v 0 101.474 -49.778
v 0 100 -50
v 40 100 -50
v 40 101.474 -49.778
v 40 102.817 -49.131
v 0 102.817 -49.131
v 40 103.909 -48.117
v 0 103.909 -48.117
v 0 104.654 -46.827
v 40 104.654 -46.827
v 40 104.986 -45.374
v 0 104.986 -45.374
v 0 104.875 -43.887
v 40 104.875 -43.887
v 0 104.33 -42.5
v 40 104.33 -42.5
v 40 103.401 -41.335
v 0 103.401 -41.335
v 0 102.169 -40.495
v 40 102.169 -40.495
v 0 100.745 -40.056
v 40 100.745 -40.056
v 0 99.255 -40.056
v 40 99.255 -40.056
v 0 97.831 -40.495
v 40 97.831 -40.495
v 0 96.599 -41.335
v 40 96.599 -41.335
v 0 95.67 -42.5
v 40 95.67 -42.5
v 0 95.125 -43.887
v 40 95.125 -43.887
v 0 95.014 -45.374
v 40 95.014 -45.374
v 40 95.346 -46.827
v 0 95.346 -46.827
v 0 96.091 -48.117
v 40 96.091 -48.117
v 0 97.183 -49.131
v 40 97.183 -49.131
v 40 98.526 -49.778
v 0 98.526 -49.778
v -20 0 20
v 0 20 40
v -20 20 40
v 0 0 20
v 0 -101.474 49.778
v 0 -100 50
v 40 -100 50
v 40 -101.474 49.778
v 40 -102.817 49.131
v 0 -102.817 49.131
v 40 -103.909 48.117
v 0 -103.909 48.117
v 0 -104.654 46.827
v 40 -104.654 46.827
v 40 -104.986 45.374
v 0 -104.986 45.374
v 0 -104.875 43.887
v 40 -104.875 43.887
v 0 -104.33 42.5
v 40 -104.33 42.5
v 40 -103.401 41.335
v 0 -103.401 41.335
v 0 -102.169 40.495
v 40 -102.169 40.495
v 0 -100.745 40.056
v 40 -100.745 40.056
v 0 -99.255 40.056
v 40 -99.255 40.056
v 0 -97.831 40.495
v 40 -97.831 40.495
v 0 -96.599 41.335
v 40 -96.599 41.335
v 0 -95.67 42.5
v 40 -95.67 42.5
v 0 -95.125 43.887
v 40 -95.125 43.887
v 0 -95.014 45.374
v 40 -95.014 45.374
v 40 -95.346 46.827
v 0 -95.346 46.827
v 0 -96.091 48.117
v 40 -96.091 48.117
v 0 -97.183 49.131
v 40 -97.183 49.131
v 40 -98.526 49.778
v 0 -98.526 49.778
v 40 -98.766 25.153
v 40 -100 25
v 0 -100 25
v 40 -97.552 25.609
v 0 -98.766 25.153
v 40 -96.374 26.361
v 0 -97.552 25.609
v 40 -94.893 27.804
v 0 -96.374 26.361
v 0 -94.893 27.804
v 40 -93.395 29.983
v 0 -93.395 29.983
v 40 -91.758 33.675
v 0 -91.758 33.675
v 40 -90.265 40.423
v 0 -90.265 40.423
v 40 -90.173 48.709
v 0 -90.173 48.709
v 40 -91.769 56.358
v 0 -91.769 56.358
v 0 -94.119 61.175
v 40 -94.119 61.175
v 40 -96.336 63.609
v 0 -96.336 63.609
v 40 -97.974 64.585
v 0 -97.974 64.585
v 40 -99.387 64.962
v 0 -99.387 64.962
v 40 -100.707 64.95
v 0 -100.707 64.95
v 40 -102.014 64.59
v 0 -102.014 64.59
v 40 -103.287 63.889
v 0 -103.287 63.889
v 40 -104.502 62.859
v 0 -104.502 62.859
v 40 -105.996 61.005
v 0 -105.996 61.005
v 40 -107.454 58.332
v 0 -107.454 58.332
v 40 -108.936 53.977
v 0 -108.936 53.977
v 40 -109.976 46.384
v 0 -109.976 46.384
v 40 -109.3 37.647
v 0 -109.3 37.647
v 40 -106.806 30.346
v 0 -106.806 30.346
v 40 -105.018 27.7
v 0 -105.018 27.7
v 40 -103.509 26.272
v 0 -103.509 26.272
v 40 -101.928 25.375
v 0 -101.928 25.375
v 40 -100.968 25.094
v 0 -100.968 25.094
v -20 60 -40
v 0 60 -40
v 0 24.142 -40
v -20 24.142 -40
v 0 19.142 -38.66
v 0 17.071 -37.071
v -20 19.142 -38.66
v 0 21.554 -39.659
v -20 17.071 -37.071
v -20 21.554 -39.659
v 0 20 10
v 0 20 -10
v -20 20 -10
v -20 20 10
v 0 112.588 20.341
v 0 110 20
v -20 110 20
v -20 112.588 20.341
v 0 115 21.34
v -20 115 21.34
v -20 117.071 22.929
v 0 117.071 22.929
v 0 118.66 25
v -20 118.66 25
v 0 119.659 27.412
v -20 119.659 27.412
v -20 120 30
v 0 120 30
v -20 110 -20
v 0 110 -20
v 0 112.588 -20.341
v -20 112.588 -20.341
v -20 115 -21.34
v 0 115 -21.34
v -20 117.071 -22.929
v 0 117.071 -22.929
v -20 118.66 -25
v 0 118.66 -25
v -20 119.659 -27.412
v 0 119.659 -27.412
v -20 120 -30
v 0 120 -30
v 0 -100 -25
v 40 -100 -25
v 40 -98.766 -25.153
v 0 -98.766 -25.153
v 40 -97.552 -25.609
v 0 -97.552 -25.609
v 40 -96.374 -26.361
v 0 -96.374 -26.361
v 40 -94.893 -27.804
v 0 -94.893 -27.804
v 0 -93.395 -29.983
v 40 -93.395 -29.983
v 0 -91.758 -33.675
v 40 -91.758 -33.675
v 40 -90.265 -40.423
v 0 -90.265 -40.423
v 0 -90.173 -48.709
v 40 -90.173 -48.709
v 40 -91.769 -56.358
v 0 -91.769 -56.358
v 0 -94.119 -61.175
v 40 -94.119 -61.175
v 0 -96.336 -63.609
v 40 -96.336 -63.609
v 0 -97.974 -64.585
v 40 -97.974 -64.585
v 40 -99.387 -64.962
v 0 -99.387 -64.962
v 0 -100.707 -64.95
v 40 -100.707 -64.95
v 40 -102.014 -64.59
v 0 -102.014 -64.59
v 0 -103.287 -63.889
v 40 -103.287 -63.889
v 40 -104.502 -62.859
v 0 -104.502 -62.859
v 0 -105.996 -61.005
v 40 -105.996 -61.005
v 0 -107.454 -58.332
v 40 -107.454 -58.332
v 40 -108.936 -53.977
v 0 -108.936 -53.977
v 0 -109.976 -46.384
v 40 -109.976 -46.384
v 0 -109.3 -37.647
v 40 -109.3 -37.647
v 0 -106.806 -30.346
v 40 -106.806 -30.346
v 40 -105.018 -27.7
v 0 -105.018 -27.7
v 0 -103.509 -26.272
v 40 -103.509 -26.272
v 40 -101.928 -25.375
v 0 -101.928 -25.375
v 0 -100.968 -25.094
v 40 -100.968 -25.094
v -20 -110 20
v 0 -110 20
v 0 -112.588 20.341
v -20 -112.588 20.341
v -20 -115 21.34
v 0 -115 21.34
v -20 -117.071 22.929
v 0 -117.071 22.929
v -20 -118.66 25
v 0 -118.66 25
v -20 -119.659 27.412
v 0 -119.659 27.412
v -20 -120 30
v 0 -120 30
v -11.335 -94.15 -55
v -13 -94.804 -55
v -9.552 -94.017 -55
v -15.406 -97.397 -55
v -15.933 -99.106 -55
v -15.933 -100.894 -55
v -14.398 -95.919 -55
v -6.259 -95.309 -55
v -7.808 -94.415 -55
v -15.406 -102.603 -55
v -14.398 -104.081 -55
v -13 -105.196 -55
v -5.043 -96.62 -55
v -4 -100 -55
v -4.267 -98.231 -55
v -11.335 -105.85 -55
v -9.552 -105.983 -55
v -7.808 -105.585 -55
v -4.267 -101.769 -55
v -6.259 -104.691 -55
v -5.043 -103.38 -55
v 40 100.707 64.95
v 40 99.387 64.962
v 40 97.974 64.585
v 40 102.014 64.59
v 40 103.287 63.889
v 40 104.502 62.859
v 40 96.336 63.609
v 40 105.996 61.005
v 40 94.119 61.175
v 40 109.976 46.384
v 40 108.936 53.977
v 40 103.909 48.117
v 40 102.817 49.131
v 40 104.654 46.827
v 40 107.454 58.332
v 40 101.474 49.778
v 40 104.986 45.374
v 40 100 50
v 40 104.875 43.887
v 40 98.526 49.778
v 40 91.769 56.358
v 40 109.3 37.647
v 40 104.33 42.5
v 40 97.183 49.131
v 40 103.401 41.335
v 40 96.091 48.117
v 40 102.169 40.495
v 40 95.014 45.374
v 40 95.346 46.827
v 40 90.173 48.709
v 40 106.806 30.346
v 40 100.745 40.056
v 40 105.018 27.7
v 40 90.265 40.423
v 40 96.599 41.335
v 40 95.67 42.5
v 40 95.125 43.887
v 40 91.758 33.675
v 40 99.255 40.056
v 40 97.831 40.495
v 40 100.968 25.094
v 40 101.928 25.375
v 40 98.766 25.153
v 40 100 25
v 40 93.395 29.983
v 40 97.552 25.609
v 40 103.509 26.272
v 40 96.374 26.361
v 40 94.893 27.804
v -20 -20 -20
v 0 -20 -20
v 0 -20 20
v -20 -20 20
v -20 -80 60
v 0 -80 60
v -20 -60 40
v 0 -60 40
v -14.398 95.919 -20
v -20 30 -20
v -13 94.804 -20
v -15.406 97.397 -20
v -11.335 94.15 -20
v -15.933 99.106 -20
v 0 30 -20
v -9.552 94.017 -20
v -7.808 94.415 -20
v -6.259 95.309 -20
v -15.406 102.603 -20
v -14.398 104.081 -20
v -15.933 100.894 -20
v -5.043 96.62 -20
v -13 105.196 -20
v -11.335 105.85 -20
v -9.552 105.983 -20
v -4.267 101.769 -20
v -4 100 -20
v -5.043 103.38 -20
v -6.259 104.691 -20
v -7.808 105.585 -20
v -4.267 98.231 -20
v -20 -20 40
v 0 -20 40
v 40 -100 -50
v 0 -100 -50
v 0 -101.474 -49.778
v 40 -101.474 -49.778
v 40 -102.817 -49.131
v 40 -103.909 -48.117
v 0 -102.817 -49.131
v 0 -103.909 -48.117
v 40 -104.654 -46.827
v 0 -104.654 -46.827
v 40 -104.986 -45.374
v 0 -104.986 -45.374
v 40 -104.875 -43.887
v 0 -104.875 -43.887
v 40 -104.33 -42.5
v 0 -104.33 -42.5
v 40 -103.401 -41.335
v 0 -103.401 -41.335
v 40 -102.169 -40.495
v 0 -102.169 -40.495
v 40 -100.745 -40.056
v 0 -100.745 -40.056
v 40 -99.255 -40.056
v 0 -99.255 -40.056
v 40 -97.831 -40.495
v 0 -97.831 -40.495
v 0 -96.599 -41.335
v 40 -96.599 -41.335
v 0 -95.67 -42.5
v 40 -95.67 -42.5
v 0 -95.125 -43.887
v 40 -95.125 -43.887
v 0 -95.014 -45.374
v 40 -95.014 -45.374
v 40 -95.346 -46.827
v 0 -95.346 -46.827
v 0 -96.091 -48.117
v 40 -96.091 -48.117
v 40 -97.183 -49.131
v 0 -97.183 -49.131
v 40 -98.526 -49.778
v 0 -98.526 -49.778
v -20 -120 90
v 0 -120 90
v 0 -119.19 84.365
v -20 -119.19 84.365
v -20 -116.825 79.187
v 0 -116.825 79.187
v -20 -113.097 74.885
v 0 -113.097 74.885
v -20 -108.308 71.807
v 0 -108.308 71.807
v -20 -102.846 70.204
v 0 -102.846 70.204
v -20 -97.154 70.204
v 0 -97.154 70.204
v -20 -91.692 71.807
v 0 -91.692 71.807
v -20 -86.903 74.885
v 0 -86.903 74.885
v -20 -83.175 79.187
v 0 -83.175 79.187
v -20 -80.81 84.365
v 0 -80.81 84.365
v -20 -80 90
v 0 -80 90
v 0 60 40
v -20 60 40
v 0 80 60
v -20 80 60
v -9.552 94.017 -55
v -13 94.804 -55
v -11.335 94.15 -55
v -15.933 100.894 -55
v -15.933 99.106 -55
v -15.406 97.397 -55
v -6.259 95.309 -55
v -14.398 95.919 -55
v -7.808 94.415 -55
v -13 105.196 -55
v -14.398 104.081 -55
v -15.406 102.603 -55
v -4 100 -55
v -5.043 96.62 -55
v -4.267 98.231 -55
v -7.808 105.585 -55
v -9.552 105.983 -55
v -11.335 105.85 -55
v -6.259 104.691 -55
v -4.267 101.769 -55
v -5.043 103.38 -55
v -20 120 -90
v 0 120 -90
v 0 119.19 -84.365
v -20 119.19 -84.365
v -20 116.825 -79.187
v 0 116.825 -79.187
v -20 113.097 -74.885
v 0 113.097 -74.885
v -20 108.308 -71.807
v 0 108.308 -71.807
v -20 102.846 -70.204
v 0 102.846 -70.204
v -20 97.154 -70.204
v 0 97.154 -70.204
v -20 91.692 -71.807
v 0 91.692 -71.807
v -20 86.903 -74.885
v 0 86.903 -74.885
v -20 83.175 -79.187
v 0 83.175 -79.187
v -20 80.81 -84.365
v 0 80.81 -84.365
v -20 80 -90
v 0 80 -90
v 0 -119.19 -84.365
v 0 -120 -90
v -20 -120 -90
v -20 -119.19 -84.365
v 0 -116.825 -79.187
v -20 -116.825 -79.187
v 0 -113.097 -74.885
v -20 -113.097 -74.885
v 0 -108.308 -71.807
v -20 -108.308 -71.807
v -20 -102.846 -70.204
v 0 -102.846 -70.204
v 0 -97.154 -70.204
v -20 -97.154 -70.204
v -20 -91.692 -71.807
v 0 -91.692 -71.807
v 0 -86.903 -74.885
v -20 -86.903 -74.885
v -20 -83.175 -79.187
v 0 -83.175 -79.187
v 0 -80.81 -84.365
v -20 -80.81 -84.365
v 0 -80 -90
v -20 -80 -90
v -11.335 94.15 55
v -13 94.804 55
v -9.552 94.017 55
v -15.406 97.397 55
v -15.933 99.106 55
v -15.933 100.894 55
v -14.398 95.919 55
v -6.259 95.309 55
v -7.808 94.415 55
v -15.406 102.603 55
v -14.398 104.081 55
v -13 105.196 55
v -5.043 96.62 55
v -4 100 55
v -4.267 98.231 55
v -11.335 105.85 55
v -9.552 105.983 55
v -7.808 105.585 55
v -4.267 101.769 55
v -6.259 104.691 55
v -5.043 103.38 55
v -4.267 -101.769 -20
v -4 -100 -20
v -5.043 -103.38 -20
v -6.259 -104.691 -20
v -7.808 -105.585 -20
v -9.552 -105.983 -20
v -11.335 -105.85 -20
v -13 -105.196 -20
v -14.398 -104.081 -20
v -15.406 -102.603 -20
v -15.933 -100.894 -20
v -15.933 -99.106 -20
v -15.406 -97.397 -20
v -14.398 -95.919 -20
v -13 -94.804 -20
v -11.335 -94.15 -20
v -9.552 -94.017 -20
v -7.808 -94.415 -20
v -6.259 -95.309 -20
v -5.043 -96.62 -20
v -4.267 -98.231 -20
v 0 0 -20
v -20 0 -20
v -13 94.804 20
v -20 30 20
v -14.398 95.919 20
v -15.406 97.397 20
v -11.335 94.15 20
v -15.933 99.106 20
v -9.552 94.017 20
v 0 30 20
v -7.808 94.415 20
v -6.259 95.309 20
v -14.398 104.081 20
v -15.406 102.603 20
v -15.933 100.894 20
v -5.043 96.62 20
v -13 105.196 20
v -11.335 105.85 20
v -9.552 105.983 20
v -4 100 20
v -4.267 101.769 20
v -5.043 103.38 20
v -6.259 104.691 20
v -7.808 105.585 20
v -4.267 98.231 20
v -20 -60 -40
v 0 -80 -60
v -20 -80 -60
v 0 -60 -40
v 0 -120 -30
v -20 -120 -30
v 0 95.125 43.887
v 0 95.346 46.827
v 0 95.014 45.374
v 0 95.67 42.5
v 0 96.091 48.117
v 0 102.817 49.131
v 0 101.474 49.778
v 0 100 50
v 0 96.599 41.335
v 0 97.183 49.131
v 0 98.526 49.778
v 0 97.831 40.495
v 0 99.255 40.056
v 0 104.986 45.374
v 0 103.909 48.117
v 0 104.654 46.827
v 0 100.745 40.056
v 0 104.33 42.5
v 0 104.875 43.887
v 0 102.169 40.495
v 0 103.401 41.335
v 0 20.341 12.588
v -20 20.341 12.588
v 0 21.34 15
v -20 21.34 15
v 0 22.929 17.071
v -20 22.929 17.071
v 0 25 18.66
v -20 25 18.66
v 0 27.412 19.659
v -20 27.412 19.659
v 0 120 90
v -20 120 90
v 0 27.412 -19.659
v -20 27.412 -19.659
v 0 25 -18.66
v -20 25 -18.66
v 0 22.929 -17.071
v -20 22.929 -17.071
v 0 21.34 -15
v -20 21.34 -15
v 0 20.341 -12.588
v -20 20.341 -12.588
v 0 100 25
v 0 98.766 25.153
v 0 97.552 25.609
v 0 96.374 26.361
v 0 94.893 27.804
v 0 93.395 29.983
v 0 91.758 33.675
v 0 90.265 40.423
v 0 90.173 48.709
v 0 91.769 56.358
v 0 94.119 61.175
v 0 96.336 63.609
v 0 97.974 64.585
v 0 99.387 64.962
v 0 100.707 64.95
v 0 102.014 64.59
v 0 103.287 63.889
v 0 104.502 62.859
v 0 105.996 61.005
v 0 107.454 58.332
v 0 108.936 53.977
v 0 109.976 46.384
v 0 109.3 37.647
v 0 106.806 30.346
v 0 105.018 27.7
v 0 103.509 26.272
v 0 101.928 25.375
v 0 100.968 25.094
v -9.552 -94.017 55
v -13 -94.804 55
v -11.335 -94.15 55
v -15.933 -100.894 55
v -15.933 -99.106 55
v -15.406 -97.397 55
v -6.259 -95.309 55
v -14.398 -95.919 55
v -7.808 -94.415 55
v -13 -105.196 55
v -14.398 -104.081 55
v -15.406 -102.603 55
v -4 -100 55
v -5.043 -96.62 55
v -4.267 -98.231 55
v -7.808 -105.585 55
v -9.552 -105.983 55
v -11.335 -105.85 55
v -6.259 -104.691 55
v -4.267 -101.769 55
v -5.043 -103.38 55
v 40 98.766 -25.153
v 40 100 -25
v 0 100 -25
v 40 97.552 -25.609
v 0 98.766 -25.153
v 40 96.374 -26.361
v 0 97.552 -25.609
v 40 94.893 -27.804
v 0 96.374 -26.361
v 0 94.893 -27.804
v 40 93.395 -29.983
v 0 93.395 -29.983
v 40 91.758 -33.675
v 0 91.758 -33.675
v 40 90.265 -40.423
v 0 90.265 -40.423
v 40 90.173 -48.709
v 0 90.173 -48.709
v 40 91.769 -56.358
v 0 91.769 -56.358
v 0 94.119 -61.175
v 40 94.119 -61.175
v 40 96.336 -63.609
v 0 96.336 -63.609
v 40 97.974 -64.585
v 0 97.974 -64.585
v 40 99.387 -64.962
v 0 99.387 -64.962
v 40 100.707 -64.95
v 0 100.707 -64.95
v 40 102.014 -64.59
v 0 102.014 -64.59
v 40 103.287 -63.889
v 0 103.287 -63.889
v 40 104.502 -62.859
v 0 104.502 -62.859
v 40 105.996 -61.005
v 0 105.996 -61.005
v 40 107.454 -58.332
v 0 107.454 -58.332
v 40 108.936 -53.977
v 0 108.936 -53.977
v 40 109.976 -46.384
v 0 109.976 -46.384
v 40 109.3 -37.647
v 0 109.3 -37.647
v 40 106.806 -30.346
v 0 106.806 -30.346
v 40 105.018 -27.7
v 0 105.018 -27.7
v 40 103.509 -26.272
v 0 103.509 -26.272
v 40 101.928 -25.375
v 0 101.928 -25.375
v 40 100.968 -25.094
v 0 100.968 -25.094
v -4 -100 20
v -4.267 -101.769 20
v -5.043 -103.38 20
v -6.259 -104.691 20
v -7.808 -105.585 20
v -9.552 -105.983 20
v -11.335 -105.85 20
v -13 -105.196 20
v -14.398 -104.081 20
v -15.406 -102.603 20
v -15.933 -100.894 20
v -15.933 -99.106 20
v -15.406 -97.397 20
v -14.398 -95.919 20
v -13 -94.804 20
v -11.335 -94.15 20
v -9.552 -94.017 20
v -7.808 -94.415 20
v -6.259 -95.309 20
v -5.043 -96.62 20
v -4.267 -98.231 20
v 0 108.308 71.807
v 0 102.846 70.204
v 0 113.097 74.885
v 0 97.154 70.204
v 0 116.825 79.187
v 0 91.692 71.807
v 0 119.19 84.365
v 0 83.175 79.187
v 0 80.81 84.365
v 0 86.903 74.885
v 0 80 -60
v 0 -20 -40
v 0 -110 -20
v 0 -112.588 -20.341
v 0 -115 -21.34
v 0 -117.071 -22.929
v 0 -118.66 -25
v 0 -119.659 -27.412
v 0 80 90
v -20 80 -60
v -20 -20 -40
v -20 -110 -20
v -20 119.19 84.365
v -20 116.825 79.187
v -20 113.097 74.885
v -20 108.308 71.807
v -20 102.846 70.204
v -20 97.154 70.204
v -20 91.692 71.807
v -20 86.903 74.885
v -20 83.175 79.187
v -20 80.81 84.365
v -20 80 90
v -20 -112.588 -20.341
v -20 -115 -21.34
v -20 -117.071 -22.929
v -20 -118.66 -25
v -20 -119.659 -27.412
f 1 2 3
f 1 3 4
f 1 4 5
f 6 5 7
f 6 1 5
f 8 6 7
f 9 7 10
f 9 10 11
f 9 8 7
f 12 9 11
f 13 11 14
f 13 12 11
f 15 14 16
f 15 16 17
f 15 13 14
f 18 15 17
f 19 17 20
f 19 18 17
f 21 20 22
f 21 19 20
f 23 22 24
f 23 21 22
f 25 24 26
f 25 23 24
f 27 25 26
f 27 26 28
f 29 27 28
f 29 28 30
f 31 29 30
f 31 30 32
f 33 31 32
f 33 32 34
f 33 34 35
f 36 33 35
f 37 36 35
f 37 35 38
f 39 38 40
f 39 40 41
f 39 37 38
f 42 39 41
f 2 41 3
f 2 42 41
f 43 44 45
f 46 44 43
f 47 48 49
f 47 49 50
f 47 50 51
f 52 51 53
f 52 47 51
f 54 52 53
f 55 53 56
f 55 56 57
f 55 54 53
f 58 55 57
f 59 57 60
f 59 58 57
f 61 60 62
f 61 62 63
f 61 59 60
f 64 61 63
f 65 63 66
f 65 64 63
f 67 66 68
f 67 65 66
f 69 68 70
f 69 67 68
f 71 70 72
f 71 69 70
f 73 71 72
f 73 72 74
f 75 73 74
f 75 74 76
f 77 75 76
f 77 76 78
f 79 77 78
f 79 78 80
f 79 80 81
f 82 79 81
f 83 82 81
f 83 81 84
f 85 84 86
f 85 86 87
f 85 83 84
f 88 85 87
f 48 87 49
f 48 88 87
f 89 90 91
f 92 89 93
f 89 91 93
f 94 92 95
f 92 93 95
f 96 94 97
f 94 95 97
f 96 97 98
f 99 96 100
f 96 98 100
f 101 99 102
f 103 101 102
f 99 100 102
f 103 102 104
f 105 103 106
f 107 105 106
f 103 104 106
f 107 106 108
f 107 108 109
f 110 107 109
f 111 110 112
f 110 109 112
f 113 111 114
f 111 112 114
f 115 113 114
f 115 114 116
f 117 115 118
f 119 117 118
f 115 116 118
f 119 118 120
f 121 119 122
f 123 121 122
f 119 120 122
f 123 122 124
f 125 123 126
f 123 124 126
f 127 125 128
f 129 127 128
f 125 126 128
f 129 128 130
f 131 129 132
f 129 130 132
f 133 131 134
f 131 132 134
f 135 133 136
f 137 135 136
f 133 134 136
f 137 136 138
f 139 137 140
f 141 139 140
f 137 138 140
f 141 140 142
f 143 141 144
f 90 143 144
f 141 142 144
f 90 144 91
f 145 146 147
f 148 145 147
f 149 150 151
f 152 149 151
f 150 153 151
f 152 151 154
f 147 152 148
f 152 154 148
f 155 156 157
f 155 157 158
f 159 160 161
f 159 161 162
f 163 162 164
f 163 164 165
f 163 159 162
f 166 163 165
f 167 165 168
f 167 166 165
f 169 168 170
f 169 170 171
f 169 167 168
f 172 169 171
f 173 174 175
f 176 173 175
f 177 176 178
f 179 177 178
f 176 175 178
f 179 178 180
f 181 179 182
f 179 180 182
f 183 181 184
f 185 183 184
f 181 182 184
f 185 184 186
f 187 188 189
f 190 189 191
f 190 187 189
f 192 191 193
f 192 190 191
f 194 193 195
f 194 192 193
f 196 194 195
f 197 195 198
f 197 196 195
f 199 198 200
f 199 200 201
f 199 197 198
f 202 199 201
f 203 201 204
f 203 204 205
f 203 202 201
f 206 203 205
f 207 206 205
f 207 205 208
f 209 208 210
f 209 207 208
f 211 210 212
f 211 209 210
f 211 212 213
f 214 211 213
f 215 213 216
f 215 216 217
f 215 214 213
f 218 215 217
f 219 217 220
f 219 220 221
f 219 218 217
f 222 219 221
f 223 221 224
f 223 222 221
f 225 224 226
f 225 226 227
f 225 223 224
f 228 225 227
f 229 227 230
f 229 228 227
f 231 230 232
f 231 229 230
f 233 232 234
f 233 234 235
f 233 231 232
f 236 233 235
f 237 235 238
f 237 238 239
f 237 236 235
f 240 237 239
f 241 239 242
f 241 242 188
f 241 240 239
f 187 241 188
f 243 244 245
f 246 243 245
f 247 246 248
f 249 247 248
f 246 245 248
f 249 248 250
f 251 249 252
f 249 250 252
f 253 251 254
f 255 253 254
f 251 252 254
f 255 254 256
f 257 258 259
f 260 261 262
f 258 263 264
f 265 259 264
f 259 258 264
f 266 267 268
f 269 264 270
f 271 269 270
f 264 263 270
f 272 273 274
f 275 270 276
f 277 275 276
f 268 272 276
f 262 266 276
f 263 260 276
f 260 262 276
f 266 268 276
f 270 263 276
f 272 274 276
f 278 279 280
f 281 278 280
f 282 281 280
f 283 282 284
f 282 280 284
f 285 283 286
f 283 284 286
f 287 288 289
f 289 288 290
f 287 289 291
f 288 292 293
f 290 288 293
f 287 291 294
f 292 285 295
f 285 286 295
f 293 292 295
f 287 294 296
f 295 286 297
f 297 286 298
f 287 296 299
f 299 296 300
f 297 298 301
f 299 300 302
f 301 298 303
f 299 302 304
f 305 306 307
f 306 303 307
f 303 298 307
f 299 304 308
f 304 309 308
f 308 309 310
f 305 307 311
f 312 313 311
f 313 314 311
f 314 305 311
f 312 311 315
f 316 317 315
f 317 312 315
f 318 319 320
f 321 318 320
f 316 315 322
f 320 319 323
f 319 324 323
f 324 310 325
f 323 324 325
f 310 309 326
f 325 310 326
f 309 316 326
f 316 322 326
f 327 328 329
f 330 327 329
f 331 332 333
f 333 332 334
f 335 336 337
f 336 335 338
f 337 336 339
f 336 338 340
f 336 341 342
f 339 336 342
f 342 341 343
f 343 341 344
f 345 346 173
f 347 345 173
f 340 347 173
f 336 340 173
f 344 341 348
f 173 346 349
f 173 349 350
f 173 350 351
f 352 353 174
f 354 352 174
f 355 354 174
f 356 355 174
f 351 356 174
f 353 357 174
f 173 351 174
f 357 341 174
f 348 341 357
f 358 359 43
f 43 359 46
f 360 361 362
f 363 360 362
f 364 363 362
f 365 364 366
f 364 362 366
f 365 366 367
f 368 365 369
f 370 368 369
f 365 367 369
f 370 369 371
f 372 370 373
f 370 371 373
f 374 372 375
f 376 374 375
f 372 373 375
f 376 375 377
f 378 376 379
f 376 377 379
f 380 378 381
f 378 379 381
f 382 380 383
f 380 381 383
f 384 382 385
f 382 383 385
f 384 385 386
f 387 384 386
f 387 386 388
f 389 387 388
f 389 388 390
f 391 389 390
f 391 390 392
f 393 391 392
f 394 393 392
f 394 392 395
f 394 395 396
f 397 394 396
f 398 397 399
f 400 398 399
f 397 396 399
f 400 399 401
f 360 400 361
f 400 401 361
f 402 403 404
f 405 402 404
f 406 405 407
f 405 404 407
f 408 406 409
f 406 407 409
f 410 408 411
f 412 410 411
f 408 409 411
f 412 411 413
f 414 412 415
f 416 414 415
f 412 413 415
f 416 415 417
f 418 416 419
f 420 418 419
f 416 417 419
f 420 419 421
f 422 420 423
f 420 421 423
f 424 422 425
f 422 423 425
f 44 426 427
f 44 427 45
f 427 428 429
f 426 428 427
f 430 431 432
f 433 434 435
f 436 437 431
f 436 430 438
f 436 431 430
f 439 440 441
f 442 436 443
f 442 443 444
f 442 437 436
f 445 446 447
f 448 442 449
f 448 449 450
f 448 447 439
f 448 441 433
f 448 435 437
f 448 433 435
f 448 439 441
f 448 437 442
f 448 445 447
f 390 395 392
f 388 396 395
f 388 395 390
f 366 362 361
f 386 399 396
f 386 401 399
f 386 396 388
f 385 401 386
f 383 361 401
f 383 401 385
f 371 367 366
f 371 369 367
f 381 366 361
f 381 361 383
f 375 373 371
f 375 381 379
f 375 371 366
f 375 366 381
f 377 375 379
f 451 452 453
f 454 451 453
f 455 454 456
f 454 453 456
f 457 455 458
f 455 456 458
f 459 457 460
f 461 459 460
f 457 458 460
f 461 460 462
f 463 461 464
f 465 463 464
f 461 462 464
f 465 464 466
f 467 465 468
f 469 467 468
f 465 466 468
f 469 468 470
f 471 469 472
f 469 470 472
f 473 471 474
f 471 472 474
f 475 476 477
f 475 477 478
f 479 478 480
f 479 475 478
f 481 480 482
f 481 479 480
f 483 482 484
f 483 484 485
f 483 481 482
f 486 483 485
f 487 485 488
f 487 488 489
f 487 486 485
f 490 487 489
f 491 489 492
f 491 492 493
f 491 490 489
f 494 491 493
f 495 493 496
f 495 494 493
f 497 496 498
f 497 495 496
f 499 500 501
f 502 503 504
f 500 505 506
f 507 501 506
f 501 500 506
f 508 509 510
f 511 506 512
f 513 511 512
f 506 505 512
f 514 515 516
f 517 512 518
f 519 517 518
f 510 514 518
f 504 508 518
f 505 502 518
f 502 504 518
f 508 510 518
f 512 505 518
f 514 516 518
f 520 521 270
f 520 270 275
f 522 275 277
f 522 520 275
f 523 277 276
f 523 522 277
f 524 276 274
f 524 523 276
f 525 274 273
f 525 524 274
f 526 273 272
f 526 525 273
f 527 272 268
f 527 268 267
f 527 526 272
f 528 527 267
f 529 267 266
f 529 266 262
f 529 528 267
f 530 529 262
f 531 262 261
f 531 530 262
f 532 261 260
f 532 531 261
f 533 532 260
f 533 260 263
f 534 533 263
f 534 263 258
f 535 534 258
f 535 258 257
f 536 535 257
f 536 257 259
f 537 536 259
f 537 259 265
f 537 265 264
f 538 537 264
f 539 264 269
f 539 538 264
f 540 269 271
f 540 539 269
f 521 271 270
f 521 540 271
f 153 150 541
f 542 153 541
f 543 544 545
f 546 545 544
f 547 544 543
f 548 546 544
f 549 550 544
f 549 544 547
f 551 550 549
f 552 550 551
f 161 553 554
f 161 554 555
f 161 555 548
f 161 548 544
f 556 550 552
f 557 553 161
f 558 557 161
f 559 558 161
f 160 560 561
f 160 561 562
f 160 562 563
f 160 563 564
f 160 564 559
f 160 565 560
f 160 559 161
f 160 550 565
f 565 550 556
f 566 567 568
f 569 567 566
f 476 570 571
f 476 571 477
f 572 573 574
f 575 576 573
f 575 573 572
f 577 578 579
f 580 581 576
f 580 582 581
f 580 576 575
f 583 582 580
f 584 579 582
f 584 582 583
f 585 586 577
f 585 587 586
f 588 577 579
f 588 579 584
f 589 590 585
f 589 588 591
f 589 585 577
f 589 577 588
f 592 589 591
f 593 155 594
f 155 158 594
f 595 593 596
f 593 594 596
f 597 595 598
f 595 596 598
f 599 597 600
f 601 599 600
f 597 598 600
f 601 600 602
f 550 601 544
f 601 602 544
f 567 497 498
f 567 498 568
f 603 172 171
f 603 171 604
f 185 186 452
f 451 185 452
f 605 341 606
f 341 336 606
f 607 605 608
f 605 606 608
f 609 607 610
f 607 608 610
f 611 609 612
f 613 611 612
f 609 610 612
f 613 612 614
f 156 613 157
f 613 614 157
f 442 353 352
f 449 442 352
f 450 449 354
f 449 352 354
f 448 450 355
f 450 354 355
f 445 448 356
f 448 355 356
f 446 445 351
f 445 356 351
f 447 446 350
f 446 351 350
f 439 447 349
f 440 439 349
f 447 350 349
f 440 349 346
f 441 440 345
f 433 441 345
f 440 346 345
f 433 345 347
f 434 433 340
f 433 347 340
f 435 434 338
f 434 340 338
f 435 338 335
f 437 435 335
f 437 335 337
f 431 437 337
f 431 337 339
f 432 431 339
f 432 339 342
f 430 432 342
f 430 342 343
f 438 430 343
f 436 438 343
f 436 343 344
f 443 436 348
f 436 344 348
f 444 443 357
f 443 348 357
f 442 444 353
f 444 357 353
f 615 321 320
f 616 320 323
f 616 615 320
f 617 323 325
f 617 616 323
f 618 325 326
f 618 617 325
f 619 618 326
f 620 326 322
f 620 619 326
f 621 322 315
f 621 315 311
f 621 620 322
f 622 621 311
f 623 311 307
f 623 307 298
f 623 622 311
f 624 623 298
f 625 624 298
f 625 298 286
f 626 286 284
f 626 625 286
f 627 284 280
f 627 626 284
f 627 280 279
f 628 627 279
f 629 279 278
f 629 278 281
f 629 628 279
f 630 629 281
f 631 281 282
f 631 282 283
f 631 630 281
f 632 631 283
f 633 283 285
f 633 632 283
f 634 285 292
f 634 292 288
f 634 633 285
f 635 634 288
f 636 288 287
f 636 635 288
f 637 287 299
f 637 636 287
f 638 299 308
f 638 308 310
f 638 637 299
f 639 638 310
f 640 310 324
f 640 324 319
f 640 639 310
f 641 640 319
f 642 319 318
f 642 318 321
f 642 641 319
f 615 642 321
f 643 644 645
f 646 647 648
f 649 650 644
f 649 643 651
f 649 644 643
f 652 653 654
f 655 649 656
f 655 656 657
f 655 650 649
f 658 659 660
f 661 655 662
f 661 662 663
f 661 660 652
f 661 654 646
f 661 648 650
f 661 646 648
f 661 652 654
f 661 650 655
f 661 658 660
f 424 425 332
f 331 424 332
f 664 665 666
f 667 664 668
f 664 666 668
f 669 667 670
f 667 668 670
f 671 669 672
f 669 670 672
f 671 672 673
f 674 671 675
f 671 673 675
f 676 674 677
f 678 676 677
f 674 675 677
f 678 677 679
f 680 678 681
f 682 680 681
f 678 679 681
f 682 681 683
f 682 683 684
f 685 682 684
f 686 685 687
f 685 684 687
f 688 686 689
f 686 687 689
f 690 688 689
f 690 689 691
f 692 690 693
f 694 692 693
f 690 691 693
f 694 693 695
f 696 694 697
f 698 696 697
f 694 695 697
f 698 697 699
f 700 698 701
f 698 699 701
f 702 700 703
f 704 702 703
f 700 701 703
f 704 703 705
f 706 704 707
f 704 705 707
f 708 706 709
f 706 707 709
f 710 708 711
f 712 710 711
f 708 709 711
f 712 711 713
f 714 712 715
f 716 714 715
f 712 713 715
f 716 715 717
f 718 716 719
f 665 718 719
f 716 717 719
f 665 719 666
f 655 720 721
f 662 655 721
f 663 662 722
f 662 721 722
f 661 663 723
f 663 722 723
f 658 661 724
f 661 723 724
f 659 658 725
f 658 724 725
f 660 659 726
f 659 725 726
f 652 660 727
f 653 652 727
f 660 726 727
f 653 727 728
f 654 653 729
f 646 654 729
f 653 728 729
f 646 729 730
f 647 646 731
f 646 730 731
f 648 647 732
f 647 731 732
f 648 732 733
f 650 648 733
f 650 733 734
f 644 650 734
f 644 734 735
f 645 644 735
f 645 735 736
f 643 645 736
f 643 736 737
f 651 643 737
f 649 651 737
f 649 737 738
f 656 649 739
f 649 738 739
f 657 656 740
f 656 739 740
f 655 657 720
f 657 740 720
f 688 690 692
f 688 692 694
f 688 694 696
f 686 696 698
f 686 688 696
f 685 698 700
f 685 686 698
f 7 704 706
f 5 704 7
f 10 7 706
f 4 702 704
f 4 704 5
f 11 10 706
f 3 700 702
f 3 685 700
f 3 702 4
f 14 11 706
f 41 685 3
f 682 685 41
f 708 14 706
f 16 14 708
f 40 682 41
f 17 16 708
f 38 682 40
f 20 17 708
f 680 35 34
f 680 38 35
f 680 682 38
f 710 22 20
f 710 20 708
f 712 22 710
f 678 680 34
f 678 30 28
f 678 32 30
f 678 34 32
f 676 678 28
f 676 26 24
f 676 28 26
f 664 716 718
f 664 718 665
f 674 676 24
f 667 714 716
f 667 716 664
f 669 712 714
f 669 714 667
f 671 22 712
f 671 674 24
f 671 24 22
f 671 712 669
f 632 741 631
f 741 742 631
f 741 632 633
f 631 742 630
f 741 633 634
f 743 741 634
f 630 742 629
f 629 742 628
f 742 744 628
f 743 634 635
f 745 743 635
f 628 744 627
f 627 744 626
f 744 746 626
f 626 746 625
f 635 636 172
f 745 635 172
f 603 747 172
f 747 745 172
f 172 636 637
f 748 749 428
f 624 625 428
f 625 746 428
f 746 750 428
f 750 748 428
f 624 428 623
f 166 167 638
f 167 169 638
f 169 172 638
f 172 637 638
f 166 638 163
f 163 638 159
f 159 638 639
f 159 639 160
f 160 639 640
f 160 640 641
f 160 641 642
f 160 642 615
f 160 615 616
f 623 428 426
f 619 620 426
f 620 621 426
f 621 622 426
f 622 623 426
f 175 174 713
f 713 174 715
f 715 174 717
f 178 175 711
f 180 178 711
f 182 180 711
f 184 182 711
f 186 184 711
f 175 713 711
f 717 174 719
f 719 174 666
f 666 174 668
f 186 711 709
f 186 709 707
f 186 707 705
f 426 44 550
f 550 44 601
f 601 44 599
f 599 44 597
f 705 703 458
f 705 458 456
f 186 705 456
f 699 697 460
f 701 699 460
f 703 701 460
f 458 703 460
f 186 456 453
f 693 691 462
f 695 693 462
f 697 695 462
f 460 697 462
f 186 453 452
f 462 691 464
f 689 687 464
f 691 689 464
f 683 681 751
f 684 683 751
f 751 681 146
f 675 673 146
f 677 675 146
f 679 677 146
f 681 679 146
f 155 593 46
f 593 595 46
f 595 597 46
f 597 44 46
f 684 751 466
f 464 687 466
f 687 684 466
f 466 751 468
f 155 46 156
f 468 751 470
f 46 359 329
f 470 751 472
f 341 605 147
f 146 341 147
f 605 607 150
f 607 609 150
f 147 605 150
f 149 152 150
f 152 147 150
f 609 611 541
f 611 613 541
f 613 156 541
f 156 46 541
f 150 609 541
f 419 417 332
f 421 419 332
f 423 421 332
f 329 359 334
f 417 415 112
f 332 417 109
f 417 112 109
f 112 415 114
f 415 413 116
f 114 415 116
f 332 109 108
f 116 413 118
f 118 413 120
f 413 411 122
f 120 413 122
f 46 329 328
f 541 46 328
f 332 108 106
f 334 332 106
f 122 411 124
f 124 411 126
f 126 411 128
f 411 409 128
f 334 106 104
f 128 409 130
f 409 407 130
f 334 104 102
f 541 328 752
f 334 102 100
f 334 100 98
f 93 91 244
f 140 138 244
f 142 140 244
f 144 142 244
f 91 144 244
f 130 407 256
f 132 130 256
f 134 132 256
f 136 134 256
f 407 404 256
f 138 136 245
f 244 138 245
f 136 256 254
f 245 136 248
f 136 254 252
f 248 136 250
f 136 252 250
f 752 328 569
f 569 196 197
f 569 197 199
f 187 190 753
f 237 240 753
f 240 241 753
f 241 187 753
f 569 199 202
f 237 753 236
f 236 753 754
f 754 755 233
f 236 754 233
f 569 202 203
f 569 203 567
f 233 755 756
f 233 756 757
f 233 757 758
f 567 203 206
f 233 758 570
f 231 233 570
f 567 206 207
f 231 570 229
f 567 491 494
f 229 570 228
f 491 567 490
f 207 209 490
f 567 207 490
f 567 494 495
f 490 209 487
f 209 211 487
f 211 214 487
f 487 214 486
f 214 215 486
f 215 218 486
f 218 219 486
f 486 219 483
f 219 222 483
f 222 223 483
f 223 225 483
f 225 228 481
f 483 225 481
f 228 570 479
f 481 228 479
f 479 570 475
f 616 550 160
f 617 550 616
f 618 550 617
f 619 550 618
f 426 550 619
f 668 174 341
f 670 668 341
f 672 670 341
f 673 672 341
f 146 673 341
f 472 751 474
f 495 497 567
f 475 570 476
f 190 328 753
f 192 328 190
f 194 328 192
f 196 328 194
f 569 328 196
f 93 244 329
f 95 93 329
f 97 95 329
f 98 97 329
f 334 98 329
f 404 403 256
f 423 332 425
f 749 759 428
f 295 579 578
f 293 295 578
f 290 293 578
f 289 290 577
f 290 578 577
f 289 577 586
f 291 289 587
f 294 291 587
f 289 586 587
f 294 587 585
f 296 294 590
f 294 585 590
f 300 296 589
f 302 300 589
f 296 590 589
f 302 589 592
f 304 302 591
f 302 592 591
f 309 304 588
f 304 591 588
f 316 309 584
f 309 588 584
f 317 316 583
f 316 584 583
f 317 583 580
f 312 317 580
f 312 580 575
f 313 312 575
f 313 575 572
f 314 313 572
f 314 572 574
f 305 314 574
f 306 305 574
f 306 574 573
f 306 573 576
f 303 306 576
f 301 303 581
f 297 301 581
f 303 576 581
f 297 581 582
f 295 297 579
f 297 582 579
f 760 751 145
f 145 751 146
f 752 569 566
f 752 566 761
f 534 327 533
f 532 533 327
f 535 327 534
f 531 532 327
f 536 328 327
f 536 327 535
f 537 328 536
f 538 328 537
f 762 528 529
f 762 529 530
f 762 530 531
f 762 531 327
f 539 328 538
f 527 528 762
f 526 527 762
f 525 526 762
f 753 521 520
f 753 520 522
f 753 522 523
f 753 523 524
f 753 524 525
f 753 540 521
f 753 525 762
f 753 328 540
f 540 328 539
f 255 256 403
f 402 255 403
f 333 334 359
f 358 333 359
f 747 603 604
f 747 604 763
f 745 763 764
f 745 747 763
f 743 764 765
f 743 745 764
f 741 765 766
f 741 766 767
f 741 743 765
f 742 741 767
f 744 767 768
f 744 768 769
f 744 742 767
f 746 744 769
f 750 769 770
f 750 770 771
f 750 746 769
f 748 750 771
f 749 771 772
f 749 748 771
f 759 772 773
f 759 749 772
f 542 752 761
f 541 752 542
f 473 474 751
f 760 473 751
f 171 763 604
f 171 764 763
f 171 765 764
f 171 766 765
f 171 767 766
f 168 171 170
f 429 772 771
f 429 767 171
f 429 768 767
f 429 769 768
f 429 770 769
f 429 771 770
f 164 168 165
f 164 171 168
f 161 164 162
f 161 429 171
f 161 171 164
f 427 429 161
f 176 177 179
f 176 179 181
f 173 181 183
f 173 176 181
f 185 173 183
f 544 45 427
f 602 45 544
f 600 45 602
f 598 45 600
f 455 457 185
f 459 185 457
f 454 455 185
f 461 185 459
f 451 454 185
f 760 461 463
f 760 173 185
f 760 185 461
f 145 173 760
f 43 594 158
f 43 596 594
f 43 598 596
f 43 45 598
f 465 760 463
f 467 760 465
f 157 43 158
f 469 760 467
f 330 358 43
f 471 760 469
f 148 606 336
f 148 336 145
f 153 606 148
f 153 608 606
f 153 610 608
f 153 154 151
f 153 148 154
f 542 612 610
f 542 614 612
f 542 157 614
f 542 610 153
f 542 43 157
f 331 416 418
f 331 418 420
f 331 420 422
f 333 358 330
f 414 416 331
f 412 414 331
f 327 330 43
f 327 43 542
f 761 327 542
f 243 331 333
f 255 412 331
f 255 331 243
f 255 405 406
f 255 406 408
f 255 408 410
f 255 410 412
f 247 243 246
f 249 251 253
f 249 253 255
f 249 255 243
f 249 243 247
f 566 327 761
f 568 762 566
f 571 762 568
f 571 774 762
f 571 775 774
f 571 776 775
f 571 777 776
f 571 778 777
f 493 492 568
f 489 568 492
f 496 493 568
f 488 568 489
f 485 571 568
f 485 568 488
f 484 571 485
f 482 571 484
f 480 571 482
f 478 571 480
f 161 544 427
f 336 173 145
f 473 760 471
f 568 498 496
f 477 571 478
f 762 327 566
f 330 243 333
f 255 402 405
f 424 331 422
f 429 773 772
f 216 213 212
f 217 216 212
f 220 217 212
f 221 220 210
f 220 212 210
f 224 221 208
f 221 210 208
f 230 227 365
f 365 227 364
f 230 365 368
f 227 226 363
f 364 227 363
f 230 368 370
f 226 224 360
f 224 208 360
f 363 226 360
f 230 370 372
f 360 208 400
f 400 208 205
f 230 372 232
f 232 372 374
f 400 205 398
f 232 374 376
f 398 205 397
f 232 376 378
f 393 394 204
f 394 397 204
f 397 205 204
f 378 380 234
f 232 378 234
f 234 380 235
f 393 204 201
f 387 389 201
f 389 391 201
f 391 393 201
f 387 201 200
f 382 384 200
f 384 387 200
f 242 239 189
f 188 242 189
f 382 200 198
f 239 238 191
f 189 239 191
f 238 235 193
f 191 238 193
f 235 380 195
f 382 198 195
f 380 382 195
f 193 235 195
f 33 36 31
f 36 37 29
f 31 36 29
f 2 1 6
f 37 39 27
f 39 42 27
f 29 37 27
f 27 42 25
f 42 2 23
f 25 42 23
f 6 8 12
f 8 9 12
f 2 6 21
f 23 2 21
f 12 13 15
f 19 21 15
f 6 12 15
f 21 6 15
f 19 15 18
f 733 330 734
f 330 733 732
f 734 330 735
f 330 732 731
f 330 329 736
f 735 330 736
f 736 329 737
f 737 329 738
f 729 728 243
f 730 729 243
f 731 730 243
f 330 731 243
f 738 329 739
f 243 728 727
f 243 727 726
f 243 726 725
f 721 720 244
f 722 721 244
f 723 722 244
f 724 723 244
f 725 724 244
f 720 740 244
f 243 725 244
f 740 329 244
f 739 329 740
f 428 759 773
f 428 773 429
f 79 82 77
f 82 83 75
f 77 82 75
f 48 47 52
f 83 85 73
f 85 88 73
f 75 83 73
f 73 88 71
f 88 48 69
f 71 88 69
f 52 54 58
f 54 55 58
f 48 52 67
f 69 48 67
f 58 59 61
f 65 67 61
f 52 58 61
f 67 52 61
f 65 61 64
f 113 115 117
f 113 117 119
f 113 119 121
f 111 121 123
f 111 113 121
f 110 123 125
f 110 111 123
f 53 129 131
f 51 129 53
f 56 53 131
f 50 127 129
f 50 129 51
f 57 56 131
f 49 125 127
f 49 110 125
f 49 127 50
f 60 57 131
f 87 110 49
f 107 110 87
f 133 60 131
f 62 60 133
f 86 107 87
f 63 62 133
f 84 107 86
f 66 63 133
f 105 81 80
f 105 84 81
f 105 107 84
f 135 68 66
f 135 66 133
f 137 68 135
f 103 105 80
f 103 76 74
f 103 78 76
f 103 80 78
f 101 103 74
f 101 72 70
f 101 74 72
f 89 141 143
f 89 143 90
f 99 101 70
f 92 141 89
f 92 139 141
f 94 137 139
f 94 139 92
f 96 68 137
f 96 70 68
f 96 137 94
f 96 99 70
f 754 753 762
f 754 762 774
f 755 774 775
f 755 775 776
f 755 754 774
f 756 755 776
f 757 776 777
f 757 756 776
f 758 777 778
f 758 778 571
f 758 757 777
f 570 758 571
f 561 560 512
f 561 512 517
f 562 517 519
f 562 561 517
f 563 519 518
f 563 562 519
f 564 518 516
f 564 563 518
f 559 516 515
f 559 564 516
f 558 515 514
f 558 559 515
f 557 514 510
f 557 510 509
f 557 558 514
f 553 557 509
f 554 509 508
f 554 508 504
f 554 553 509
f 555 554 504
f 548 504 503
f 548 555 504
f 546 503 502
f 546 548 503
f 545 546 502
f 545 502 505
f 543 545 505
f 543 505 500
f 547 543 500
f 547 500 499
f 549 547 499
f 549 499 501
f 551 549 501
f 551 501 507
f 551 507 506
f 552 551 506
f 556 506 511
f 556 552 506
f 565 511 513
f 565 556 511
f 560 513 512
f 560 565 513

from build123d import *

# Parameters (mm, degrees)
BOSS_EXTRUDE1_DEPTH = 20
SKETCH1_4_RX        = 20
SKETCH1_4_RY        = 10
SKETCH1_4_R         = 5
BOSS_EXTRUDE2_DEPTH = 40
SKETCH2_R           = 6
CUT_EXTRUDE1_DEPTH  = 35
FILLET1_R           = 10


with BuildPart() as part:
    # Sketch1 → Boss-Extrude1 (new body)
    with BuildSketch(Plane(origin=(0, 0, 0), x_dir=(0, 0, -1), z_dir=(1, 0, 0))):
        with BuildLine():
            Line((0, 0), (0, 20))
            Line((0, 20), (20, 20))
            Line((20, 20), (20, 110))
            ThreePointArc((20, 110), (22.928932188, 117.071067812), (30, 120))
            Line((30, 120), (90, 120))
            ThreePointArc((90, 120), (70, 100), (90, 80))
            Line((90, 80), (60, 80))
            Line((60, 80), (40, 60))
            Line((40, 60), (40, 20))
            Line((40, 20), (20, 0))
            Line((20, 0), (0, 0))
        make_face()
    extrude(amount=-BOSS_EXTRUDE1_DEPTH)

    # Sketch1<4> → Boss-Extrude2 (add)
    with BuildSketch(Plane(origin=(0, 0, 0), x_dir=(0, 0, -1), z_dir=(1, 0, 0))):
        with Locations(Location((45, 100), (0, 0, 180))):
            Ellipse(SKETCH1_4_RX, SKETCH1_4_RY)
        with Locations((45, 100)):
            Circle(SKETCH1_4_R, mode=Mode.SUBTRACT)
    extrude(amount=BOSS_EXTRUDE2_DEPTH)

    # Sketch2 → Cut-Extrude1 (cut)
    with BuildSketch(Plane.XY.offset(-20)):
        with Locations((-10, 100)):
            Circle(SKETCH2_R)
    extrude(amount=-CUT_EXTRUDE1_DEPTH, mode=Mode.SUBTRACT)

    # Mirror1: part across plane


with BuildPart() as part_1:
    add(part.part)
    add(part.part.mirror(Plane(origin=(-20, 0, 0), x_dir=(1, 0, 0), z_dir=(0, 0, -1))))

    # Mirror2: part across plane


with BuildPart() as part_2:
    add(part_1.part)
    add(part_1.part.mirror(Plane(origin=(-20, 0, -20), x_dir=(0, 0, 1), z_dir=(0, 1, 0))))

    # Fillet1
    fillet1_edges = [part_2.edges().sort_by_distance(p)[0] for p in [
        (-10, 20, -40),
        (-10, 20, -20),
        (-10, 20, 20),
    ]]
    fillet(fillet1_edges, radius=FILLET1_R)


solid = part_2.part
